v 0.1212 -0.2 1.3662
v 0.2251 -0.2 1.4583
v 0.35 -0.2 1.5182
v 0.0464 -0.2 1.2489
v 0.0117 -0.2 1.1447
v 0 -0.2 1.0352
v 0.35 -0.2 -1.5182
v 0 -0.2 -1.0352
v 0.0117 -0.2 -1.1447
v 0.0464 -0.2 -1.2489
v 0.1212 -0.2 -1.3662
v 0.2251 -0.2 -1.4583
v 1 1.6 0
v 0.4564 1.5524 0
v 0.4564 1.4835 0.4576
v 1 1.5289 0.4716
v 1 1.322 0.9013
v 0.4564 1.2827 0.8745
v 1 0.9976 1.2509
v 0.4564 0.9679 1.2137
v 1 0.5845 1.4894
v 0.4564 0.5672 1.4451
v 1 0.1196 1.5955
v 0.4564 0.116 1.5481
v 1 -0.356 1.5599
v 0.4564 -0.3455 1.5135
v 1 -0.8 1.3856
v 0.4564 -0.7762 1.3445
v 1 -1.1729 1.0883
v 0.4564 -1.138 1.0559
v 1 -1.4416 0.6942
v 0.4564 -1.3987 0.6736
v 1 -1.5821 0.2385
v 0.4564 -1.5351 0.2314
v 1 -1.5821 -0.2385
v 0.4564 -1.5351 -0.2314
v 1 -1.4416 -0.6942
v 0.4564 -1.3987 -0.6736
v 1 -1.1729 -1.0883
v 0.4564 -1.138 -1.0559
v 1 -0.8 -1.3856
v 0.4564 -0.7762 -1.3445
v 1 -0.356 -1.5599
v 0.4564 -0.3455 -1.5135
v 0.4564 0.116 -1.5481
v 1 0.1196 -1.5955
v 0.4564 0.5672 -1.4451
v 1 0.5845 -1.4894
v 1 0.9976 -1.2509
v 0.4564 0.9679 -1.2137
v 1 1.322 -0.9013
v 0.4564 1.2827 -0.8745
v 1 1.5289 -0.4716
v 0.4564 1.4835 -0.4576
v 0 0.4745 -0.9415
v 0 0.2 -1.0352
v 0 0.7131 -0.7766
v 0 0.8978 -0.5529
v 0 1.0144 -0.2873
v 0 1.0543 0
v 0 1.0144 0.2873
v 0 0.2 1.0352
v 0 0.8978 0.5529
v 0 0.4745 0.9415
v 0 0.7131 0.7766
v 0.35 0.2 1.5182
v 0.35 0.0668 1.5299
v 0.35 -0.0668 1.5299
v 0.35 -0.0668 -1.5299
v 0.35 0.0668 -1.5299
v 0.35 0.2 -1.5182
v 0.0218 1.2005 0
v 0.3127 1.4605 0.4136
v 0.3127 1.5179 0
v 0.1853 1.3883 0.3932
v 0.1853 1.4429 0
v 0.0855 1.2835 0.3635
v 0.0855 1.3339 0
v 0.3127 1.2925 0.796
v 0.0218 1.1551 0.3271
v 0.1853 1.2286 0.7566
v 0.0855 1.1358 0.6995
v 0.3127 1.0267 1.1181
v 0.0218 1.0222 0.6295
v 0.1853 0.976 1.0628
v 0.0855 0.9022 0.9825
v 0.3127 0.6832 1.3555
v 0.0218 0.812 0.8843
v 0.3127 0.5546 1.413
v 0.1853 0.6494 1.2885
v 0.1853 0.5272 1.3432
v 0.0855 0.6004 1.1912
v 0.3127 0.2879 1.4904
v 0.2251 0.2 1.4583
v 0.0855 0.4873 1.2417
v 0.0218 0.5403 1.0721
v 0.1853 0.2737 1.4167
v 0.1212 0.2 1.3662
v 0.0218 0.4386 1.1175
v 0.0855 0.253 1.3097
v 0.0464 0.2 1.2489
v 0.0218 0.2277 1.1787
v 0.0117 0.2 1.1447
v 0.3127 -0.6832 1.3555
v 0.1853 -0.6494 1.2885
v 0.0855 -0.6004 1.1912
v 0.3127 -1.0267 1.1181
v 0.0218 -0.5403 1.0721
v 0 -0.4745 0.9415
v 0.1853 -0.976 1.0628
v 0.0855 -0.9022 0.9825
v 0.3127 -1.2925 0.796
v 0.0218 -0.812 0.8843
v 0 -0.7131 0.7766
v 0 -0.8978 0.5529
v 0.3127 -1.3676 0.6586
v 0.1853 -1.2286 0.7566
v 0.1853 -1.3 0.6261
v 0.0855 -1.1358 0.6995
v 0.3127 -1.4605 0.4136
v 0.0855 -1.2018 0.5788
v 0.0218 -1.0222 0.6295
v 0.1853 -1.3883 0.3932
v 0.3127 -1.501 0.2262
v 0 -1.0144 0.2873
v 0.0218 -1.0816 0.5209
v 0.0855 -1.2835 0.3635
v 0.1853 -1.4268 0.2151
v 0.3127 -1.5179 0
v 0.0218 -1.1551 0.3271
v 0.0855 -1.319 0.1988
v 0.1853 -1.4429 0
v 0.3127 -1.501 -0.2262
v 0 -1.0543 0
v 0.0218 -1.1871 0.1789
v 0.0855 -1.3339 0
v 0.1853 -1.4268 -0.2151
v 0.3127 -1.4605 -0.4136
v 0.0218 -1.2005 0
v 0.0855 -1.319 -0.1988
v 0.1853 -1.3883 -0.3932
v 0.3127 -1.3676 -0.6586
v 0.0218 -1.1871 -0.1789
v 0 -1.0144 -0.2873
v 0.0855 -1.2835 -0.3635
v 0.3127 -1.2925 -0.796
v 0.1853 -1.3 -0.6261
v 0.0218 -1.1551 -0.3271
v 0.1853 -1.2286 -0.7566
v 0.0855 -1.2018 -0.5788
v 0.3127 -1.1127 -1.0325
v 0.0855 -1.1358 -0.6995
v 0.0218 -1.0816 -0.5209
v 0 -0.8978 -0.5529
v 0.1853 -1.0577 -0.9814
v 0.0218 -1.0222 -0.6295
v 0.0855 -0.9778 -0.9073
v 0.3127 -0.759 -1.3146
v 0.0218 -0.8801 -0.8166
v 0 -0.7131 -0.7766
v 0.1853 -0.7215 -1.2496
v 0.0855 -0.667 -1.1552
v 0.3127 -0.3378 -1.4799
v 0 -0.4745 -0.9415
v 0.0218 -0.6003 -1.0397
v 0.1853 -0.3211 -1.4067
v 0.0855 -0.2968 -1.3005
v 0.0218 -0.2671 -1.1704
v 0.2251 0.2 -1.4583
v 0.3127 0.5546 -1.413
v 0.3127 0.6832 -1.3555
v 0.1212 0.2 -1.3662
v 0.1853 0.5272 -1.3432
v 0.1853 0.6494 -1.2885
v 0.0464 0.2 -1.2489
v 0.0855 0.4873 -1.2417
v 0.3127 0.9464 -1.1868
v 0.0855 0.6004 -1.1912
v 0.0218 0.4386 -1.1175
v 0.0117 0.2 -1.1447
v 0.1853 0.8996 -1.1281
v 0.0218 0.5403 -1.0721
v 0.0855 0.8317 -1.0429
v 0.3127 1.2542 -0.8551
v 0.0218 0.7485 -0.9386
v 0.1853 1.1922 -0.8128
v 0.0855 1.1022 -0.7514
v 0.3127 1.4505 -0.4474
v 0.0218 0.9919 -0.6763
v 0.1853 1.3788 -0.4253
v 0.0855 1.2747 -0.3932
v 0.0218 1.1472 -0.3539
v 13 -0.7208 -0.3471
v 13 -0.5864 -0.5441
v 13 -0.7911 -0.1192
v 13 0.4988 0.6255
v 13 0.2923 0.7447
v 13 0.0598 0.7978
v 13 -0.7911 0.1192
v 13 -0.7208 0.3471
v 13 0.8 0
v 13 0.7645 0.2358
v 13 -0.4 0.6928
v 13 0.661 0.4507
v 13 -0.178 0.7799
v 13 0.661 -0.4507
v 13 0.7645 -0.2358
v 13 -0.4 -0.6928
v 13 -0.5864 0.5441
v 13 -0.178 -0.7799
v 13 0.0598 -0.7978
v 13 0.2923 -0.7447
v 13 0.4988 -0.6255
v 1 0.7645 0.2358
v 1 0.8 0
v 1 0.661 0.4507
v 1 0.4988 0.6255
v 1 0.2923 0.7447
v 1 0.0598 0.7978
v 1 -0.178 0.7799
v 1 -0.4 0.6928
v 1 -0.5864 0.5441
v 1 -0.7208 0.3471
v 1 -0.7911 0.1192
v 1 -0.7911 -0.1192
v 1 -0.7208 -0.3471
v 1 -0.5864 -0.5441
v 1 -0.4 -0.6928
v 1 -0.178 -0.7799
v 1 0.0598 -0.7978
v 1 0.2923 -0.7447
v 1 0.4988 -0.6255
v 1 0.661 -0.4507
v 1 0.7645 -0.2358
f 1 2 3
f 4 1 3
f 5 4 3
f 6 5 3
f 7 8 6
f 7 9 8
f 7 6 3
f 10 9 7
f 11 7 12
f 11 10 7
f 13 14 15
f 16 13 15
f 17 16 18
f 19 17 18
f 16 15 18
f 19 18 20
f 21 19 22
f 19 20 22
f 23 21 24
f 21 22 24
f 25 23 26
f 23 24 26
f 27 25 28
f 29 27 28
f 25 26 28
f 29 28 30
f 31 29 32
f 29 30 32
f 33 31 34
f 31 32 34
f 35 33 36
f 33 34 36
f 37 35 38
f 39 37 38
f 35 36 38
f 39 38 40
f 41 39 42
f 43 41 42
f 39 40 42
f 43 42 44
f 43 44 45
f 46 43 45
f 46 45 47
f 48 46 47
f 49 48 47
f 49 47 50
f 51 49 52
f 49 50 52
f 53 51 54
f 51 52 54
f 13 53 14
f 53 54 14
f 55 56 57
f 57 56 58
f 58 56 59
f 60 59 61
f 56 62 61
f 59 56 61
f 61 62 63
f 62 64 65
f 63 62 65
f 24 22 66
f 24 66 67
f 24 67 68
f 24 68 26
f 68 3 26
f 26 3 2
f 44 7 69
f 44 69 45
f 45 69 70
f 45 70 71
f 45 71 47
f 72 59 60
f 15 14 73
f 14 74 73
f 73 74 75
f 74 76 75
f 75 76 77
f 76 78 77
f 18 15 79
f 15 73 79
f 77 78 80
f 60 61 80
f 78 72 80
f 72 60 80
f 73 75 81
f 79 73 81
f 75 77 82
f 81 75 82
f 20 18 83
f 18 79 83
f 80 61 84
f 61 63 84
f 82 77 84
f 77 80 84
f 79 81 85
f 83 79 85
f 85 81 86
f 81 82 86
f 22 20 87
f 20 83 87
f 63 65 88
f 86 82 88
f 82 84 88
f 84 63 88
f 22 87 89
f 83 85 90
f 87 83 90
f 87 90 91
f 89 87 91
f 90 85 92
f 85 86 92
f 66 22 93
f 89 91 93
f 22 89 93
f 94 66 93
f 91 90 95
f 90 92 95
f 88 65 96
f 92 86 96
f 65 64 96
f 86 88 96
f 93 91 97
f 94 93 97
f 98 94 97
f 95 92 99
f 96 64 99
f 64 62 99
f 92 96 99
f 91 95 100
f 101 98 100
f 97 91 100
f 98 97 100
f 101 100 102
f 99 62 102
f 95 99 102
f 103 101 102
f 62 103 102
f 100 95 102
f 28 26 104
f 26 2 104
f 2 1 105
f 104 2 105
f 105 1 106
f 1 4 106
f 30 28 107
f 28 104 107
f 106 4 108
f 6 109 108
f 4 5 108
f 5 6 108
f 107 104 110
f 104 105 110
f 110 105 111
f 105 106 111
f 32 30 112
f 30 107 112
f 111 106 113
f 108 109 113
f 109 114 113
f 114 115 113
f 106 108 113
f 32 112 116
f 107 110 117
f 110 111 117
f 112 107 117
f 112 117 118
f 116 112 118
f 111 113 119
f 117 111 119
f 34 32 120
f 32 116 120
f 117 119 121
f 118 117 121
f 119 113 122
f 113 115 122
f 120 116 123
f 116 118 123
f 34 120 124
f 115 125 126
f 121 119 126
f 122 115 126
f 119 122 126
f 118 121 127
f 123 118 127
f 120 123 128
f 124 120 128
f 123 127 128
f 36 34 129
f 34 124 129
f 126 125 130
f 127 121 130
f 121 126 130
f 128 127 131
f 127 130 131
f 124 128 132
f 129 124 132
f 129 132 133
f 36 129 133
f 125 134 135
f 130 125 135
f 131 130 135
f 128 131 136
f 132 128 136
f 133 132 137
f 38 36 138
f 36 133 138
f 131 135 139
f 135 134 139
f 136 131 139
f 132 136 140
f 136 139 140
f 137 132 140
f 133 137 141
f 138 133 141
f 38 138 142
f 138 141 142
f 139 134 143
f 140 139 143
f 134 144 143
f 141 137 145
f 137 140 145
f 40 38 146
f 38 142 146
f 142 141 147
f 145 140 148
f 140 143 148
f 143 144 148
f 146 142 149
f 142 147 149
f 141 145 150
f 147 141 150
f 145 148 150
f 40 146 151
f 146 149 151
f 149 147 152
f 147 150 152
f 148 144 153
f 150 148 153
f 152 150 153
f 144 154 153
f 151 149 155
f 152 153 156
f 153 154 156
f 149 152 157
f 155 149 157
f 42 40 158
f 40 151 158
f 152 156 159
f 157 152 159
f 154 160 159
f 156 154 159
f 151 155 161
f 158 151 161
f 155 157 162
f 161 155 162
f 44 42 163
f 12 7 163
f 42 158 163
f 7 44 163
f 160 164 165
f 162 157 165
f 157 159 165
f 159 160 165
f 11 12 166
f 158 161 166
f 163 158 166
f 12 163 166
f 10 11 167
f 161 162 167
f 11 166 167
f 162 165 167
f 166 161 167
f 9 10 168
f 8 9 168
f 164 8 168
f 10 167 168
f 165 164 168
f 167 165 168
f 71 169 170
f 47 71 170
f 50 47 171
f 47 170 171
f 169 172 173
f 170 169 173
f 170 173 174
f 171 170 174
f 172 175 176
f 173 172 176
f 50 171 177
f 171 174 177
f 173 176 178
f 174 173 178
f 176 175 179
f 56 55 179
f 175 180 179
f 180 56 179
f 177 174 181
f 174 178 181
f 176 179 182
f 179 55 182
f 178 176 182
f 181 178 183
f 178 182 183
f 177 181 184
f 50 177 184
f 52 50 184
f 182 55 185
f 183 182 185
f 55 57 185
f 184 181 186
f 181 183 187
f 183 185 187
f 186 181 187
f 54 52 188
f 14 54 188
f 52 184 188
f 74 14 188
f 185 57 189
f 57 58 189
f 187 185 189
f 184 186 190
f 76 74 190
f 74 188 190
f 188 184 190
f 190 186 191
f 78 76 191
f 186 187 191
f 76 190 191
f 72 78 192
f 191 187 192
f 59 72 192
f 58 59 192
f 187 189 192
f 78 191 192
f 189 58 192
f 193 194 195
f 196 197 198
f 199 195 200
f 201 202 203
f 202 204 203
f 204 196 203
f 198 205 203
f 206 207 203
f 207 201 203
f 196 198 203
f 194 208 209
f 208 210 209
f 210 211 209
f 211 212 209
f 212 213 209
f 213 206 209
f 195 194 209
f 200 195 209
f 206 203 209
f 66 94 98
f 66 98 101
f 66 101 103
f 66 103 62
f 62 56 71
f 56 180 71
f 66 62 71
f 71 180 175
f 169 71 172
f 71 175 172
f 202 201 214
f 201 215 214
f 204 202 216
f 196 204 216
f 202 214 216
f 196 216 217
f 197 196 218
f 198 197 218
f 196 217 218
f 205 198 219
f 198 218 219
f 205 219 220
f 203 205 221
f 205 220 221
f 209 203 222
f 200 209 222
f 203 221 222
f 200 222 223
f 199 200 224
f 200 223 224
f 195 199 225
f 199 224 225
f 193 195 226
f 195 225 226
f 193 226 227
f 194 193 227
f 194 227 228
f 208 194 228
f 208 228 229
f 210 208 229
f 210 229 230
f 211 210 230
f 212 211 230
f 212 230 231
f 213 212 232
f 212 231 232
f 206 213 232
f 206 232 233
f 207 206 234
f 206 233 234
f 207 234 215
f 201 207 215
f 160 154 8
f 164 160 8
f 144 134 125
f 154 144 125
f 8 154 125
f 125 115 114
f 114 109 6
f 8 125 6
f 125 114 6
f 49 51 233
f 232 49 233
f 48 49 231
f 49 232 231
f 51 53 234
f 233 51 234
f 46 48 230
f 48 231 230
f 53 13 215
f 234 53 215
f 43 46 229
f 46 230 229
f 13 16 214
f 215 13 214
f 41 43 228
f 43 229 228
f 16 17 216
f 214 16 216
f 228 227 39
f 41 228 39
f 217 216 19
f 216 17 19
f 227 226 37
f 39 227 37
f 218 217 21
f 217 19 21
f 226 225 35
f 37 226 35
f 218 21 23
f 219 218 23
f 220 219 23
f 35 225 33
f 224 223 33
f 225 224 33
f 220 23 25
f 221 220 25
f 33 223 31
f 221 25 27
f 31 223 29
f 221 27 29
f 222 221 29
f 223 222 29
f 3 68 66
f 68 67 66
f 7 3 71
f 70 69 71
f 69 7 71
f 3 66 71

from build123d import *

# Parameters (mm, degrees)
FILLET2_R  = 0.5
SKETCH2_W  = 3.2
SKETCH2_H  = 0.4
SLOT_DEPTH = 0.35


with BuildPart() as part:
    # BodySke → Base-Revolve (revolve)
    with BuildSketch(Plane.XY):
        Polygon((1, 0.8), (1, 1.6), (0, 1.512511336), (0, 0), (13, 0), (13, 0.8), align=None)
    revolve(axis=Axis((-25.4, 0, 0), (1, 0, 0)))

    # Fillet2
    fillet2_edges = [part.edges().sort_by_distance(p)[0] for p in [
        (0, -1.512511336, 0),
    ]]
    fillet(fillet2_edges, radius=FILLET2_R)

    # Sketch2 → Slot (cut)
    with BuildSketch(Plane(origin=(0, 0, 0), x_dir=(0, 0, -1), z_dir=(1, 0, 0))):
        Rectangle(SKETCH2_W, SKETCH2_H)
    extrude(amount=SLOT_DEPTH, mode=Mode.SUBTRACT)


solid = part.part
